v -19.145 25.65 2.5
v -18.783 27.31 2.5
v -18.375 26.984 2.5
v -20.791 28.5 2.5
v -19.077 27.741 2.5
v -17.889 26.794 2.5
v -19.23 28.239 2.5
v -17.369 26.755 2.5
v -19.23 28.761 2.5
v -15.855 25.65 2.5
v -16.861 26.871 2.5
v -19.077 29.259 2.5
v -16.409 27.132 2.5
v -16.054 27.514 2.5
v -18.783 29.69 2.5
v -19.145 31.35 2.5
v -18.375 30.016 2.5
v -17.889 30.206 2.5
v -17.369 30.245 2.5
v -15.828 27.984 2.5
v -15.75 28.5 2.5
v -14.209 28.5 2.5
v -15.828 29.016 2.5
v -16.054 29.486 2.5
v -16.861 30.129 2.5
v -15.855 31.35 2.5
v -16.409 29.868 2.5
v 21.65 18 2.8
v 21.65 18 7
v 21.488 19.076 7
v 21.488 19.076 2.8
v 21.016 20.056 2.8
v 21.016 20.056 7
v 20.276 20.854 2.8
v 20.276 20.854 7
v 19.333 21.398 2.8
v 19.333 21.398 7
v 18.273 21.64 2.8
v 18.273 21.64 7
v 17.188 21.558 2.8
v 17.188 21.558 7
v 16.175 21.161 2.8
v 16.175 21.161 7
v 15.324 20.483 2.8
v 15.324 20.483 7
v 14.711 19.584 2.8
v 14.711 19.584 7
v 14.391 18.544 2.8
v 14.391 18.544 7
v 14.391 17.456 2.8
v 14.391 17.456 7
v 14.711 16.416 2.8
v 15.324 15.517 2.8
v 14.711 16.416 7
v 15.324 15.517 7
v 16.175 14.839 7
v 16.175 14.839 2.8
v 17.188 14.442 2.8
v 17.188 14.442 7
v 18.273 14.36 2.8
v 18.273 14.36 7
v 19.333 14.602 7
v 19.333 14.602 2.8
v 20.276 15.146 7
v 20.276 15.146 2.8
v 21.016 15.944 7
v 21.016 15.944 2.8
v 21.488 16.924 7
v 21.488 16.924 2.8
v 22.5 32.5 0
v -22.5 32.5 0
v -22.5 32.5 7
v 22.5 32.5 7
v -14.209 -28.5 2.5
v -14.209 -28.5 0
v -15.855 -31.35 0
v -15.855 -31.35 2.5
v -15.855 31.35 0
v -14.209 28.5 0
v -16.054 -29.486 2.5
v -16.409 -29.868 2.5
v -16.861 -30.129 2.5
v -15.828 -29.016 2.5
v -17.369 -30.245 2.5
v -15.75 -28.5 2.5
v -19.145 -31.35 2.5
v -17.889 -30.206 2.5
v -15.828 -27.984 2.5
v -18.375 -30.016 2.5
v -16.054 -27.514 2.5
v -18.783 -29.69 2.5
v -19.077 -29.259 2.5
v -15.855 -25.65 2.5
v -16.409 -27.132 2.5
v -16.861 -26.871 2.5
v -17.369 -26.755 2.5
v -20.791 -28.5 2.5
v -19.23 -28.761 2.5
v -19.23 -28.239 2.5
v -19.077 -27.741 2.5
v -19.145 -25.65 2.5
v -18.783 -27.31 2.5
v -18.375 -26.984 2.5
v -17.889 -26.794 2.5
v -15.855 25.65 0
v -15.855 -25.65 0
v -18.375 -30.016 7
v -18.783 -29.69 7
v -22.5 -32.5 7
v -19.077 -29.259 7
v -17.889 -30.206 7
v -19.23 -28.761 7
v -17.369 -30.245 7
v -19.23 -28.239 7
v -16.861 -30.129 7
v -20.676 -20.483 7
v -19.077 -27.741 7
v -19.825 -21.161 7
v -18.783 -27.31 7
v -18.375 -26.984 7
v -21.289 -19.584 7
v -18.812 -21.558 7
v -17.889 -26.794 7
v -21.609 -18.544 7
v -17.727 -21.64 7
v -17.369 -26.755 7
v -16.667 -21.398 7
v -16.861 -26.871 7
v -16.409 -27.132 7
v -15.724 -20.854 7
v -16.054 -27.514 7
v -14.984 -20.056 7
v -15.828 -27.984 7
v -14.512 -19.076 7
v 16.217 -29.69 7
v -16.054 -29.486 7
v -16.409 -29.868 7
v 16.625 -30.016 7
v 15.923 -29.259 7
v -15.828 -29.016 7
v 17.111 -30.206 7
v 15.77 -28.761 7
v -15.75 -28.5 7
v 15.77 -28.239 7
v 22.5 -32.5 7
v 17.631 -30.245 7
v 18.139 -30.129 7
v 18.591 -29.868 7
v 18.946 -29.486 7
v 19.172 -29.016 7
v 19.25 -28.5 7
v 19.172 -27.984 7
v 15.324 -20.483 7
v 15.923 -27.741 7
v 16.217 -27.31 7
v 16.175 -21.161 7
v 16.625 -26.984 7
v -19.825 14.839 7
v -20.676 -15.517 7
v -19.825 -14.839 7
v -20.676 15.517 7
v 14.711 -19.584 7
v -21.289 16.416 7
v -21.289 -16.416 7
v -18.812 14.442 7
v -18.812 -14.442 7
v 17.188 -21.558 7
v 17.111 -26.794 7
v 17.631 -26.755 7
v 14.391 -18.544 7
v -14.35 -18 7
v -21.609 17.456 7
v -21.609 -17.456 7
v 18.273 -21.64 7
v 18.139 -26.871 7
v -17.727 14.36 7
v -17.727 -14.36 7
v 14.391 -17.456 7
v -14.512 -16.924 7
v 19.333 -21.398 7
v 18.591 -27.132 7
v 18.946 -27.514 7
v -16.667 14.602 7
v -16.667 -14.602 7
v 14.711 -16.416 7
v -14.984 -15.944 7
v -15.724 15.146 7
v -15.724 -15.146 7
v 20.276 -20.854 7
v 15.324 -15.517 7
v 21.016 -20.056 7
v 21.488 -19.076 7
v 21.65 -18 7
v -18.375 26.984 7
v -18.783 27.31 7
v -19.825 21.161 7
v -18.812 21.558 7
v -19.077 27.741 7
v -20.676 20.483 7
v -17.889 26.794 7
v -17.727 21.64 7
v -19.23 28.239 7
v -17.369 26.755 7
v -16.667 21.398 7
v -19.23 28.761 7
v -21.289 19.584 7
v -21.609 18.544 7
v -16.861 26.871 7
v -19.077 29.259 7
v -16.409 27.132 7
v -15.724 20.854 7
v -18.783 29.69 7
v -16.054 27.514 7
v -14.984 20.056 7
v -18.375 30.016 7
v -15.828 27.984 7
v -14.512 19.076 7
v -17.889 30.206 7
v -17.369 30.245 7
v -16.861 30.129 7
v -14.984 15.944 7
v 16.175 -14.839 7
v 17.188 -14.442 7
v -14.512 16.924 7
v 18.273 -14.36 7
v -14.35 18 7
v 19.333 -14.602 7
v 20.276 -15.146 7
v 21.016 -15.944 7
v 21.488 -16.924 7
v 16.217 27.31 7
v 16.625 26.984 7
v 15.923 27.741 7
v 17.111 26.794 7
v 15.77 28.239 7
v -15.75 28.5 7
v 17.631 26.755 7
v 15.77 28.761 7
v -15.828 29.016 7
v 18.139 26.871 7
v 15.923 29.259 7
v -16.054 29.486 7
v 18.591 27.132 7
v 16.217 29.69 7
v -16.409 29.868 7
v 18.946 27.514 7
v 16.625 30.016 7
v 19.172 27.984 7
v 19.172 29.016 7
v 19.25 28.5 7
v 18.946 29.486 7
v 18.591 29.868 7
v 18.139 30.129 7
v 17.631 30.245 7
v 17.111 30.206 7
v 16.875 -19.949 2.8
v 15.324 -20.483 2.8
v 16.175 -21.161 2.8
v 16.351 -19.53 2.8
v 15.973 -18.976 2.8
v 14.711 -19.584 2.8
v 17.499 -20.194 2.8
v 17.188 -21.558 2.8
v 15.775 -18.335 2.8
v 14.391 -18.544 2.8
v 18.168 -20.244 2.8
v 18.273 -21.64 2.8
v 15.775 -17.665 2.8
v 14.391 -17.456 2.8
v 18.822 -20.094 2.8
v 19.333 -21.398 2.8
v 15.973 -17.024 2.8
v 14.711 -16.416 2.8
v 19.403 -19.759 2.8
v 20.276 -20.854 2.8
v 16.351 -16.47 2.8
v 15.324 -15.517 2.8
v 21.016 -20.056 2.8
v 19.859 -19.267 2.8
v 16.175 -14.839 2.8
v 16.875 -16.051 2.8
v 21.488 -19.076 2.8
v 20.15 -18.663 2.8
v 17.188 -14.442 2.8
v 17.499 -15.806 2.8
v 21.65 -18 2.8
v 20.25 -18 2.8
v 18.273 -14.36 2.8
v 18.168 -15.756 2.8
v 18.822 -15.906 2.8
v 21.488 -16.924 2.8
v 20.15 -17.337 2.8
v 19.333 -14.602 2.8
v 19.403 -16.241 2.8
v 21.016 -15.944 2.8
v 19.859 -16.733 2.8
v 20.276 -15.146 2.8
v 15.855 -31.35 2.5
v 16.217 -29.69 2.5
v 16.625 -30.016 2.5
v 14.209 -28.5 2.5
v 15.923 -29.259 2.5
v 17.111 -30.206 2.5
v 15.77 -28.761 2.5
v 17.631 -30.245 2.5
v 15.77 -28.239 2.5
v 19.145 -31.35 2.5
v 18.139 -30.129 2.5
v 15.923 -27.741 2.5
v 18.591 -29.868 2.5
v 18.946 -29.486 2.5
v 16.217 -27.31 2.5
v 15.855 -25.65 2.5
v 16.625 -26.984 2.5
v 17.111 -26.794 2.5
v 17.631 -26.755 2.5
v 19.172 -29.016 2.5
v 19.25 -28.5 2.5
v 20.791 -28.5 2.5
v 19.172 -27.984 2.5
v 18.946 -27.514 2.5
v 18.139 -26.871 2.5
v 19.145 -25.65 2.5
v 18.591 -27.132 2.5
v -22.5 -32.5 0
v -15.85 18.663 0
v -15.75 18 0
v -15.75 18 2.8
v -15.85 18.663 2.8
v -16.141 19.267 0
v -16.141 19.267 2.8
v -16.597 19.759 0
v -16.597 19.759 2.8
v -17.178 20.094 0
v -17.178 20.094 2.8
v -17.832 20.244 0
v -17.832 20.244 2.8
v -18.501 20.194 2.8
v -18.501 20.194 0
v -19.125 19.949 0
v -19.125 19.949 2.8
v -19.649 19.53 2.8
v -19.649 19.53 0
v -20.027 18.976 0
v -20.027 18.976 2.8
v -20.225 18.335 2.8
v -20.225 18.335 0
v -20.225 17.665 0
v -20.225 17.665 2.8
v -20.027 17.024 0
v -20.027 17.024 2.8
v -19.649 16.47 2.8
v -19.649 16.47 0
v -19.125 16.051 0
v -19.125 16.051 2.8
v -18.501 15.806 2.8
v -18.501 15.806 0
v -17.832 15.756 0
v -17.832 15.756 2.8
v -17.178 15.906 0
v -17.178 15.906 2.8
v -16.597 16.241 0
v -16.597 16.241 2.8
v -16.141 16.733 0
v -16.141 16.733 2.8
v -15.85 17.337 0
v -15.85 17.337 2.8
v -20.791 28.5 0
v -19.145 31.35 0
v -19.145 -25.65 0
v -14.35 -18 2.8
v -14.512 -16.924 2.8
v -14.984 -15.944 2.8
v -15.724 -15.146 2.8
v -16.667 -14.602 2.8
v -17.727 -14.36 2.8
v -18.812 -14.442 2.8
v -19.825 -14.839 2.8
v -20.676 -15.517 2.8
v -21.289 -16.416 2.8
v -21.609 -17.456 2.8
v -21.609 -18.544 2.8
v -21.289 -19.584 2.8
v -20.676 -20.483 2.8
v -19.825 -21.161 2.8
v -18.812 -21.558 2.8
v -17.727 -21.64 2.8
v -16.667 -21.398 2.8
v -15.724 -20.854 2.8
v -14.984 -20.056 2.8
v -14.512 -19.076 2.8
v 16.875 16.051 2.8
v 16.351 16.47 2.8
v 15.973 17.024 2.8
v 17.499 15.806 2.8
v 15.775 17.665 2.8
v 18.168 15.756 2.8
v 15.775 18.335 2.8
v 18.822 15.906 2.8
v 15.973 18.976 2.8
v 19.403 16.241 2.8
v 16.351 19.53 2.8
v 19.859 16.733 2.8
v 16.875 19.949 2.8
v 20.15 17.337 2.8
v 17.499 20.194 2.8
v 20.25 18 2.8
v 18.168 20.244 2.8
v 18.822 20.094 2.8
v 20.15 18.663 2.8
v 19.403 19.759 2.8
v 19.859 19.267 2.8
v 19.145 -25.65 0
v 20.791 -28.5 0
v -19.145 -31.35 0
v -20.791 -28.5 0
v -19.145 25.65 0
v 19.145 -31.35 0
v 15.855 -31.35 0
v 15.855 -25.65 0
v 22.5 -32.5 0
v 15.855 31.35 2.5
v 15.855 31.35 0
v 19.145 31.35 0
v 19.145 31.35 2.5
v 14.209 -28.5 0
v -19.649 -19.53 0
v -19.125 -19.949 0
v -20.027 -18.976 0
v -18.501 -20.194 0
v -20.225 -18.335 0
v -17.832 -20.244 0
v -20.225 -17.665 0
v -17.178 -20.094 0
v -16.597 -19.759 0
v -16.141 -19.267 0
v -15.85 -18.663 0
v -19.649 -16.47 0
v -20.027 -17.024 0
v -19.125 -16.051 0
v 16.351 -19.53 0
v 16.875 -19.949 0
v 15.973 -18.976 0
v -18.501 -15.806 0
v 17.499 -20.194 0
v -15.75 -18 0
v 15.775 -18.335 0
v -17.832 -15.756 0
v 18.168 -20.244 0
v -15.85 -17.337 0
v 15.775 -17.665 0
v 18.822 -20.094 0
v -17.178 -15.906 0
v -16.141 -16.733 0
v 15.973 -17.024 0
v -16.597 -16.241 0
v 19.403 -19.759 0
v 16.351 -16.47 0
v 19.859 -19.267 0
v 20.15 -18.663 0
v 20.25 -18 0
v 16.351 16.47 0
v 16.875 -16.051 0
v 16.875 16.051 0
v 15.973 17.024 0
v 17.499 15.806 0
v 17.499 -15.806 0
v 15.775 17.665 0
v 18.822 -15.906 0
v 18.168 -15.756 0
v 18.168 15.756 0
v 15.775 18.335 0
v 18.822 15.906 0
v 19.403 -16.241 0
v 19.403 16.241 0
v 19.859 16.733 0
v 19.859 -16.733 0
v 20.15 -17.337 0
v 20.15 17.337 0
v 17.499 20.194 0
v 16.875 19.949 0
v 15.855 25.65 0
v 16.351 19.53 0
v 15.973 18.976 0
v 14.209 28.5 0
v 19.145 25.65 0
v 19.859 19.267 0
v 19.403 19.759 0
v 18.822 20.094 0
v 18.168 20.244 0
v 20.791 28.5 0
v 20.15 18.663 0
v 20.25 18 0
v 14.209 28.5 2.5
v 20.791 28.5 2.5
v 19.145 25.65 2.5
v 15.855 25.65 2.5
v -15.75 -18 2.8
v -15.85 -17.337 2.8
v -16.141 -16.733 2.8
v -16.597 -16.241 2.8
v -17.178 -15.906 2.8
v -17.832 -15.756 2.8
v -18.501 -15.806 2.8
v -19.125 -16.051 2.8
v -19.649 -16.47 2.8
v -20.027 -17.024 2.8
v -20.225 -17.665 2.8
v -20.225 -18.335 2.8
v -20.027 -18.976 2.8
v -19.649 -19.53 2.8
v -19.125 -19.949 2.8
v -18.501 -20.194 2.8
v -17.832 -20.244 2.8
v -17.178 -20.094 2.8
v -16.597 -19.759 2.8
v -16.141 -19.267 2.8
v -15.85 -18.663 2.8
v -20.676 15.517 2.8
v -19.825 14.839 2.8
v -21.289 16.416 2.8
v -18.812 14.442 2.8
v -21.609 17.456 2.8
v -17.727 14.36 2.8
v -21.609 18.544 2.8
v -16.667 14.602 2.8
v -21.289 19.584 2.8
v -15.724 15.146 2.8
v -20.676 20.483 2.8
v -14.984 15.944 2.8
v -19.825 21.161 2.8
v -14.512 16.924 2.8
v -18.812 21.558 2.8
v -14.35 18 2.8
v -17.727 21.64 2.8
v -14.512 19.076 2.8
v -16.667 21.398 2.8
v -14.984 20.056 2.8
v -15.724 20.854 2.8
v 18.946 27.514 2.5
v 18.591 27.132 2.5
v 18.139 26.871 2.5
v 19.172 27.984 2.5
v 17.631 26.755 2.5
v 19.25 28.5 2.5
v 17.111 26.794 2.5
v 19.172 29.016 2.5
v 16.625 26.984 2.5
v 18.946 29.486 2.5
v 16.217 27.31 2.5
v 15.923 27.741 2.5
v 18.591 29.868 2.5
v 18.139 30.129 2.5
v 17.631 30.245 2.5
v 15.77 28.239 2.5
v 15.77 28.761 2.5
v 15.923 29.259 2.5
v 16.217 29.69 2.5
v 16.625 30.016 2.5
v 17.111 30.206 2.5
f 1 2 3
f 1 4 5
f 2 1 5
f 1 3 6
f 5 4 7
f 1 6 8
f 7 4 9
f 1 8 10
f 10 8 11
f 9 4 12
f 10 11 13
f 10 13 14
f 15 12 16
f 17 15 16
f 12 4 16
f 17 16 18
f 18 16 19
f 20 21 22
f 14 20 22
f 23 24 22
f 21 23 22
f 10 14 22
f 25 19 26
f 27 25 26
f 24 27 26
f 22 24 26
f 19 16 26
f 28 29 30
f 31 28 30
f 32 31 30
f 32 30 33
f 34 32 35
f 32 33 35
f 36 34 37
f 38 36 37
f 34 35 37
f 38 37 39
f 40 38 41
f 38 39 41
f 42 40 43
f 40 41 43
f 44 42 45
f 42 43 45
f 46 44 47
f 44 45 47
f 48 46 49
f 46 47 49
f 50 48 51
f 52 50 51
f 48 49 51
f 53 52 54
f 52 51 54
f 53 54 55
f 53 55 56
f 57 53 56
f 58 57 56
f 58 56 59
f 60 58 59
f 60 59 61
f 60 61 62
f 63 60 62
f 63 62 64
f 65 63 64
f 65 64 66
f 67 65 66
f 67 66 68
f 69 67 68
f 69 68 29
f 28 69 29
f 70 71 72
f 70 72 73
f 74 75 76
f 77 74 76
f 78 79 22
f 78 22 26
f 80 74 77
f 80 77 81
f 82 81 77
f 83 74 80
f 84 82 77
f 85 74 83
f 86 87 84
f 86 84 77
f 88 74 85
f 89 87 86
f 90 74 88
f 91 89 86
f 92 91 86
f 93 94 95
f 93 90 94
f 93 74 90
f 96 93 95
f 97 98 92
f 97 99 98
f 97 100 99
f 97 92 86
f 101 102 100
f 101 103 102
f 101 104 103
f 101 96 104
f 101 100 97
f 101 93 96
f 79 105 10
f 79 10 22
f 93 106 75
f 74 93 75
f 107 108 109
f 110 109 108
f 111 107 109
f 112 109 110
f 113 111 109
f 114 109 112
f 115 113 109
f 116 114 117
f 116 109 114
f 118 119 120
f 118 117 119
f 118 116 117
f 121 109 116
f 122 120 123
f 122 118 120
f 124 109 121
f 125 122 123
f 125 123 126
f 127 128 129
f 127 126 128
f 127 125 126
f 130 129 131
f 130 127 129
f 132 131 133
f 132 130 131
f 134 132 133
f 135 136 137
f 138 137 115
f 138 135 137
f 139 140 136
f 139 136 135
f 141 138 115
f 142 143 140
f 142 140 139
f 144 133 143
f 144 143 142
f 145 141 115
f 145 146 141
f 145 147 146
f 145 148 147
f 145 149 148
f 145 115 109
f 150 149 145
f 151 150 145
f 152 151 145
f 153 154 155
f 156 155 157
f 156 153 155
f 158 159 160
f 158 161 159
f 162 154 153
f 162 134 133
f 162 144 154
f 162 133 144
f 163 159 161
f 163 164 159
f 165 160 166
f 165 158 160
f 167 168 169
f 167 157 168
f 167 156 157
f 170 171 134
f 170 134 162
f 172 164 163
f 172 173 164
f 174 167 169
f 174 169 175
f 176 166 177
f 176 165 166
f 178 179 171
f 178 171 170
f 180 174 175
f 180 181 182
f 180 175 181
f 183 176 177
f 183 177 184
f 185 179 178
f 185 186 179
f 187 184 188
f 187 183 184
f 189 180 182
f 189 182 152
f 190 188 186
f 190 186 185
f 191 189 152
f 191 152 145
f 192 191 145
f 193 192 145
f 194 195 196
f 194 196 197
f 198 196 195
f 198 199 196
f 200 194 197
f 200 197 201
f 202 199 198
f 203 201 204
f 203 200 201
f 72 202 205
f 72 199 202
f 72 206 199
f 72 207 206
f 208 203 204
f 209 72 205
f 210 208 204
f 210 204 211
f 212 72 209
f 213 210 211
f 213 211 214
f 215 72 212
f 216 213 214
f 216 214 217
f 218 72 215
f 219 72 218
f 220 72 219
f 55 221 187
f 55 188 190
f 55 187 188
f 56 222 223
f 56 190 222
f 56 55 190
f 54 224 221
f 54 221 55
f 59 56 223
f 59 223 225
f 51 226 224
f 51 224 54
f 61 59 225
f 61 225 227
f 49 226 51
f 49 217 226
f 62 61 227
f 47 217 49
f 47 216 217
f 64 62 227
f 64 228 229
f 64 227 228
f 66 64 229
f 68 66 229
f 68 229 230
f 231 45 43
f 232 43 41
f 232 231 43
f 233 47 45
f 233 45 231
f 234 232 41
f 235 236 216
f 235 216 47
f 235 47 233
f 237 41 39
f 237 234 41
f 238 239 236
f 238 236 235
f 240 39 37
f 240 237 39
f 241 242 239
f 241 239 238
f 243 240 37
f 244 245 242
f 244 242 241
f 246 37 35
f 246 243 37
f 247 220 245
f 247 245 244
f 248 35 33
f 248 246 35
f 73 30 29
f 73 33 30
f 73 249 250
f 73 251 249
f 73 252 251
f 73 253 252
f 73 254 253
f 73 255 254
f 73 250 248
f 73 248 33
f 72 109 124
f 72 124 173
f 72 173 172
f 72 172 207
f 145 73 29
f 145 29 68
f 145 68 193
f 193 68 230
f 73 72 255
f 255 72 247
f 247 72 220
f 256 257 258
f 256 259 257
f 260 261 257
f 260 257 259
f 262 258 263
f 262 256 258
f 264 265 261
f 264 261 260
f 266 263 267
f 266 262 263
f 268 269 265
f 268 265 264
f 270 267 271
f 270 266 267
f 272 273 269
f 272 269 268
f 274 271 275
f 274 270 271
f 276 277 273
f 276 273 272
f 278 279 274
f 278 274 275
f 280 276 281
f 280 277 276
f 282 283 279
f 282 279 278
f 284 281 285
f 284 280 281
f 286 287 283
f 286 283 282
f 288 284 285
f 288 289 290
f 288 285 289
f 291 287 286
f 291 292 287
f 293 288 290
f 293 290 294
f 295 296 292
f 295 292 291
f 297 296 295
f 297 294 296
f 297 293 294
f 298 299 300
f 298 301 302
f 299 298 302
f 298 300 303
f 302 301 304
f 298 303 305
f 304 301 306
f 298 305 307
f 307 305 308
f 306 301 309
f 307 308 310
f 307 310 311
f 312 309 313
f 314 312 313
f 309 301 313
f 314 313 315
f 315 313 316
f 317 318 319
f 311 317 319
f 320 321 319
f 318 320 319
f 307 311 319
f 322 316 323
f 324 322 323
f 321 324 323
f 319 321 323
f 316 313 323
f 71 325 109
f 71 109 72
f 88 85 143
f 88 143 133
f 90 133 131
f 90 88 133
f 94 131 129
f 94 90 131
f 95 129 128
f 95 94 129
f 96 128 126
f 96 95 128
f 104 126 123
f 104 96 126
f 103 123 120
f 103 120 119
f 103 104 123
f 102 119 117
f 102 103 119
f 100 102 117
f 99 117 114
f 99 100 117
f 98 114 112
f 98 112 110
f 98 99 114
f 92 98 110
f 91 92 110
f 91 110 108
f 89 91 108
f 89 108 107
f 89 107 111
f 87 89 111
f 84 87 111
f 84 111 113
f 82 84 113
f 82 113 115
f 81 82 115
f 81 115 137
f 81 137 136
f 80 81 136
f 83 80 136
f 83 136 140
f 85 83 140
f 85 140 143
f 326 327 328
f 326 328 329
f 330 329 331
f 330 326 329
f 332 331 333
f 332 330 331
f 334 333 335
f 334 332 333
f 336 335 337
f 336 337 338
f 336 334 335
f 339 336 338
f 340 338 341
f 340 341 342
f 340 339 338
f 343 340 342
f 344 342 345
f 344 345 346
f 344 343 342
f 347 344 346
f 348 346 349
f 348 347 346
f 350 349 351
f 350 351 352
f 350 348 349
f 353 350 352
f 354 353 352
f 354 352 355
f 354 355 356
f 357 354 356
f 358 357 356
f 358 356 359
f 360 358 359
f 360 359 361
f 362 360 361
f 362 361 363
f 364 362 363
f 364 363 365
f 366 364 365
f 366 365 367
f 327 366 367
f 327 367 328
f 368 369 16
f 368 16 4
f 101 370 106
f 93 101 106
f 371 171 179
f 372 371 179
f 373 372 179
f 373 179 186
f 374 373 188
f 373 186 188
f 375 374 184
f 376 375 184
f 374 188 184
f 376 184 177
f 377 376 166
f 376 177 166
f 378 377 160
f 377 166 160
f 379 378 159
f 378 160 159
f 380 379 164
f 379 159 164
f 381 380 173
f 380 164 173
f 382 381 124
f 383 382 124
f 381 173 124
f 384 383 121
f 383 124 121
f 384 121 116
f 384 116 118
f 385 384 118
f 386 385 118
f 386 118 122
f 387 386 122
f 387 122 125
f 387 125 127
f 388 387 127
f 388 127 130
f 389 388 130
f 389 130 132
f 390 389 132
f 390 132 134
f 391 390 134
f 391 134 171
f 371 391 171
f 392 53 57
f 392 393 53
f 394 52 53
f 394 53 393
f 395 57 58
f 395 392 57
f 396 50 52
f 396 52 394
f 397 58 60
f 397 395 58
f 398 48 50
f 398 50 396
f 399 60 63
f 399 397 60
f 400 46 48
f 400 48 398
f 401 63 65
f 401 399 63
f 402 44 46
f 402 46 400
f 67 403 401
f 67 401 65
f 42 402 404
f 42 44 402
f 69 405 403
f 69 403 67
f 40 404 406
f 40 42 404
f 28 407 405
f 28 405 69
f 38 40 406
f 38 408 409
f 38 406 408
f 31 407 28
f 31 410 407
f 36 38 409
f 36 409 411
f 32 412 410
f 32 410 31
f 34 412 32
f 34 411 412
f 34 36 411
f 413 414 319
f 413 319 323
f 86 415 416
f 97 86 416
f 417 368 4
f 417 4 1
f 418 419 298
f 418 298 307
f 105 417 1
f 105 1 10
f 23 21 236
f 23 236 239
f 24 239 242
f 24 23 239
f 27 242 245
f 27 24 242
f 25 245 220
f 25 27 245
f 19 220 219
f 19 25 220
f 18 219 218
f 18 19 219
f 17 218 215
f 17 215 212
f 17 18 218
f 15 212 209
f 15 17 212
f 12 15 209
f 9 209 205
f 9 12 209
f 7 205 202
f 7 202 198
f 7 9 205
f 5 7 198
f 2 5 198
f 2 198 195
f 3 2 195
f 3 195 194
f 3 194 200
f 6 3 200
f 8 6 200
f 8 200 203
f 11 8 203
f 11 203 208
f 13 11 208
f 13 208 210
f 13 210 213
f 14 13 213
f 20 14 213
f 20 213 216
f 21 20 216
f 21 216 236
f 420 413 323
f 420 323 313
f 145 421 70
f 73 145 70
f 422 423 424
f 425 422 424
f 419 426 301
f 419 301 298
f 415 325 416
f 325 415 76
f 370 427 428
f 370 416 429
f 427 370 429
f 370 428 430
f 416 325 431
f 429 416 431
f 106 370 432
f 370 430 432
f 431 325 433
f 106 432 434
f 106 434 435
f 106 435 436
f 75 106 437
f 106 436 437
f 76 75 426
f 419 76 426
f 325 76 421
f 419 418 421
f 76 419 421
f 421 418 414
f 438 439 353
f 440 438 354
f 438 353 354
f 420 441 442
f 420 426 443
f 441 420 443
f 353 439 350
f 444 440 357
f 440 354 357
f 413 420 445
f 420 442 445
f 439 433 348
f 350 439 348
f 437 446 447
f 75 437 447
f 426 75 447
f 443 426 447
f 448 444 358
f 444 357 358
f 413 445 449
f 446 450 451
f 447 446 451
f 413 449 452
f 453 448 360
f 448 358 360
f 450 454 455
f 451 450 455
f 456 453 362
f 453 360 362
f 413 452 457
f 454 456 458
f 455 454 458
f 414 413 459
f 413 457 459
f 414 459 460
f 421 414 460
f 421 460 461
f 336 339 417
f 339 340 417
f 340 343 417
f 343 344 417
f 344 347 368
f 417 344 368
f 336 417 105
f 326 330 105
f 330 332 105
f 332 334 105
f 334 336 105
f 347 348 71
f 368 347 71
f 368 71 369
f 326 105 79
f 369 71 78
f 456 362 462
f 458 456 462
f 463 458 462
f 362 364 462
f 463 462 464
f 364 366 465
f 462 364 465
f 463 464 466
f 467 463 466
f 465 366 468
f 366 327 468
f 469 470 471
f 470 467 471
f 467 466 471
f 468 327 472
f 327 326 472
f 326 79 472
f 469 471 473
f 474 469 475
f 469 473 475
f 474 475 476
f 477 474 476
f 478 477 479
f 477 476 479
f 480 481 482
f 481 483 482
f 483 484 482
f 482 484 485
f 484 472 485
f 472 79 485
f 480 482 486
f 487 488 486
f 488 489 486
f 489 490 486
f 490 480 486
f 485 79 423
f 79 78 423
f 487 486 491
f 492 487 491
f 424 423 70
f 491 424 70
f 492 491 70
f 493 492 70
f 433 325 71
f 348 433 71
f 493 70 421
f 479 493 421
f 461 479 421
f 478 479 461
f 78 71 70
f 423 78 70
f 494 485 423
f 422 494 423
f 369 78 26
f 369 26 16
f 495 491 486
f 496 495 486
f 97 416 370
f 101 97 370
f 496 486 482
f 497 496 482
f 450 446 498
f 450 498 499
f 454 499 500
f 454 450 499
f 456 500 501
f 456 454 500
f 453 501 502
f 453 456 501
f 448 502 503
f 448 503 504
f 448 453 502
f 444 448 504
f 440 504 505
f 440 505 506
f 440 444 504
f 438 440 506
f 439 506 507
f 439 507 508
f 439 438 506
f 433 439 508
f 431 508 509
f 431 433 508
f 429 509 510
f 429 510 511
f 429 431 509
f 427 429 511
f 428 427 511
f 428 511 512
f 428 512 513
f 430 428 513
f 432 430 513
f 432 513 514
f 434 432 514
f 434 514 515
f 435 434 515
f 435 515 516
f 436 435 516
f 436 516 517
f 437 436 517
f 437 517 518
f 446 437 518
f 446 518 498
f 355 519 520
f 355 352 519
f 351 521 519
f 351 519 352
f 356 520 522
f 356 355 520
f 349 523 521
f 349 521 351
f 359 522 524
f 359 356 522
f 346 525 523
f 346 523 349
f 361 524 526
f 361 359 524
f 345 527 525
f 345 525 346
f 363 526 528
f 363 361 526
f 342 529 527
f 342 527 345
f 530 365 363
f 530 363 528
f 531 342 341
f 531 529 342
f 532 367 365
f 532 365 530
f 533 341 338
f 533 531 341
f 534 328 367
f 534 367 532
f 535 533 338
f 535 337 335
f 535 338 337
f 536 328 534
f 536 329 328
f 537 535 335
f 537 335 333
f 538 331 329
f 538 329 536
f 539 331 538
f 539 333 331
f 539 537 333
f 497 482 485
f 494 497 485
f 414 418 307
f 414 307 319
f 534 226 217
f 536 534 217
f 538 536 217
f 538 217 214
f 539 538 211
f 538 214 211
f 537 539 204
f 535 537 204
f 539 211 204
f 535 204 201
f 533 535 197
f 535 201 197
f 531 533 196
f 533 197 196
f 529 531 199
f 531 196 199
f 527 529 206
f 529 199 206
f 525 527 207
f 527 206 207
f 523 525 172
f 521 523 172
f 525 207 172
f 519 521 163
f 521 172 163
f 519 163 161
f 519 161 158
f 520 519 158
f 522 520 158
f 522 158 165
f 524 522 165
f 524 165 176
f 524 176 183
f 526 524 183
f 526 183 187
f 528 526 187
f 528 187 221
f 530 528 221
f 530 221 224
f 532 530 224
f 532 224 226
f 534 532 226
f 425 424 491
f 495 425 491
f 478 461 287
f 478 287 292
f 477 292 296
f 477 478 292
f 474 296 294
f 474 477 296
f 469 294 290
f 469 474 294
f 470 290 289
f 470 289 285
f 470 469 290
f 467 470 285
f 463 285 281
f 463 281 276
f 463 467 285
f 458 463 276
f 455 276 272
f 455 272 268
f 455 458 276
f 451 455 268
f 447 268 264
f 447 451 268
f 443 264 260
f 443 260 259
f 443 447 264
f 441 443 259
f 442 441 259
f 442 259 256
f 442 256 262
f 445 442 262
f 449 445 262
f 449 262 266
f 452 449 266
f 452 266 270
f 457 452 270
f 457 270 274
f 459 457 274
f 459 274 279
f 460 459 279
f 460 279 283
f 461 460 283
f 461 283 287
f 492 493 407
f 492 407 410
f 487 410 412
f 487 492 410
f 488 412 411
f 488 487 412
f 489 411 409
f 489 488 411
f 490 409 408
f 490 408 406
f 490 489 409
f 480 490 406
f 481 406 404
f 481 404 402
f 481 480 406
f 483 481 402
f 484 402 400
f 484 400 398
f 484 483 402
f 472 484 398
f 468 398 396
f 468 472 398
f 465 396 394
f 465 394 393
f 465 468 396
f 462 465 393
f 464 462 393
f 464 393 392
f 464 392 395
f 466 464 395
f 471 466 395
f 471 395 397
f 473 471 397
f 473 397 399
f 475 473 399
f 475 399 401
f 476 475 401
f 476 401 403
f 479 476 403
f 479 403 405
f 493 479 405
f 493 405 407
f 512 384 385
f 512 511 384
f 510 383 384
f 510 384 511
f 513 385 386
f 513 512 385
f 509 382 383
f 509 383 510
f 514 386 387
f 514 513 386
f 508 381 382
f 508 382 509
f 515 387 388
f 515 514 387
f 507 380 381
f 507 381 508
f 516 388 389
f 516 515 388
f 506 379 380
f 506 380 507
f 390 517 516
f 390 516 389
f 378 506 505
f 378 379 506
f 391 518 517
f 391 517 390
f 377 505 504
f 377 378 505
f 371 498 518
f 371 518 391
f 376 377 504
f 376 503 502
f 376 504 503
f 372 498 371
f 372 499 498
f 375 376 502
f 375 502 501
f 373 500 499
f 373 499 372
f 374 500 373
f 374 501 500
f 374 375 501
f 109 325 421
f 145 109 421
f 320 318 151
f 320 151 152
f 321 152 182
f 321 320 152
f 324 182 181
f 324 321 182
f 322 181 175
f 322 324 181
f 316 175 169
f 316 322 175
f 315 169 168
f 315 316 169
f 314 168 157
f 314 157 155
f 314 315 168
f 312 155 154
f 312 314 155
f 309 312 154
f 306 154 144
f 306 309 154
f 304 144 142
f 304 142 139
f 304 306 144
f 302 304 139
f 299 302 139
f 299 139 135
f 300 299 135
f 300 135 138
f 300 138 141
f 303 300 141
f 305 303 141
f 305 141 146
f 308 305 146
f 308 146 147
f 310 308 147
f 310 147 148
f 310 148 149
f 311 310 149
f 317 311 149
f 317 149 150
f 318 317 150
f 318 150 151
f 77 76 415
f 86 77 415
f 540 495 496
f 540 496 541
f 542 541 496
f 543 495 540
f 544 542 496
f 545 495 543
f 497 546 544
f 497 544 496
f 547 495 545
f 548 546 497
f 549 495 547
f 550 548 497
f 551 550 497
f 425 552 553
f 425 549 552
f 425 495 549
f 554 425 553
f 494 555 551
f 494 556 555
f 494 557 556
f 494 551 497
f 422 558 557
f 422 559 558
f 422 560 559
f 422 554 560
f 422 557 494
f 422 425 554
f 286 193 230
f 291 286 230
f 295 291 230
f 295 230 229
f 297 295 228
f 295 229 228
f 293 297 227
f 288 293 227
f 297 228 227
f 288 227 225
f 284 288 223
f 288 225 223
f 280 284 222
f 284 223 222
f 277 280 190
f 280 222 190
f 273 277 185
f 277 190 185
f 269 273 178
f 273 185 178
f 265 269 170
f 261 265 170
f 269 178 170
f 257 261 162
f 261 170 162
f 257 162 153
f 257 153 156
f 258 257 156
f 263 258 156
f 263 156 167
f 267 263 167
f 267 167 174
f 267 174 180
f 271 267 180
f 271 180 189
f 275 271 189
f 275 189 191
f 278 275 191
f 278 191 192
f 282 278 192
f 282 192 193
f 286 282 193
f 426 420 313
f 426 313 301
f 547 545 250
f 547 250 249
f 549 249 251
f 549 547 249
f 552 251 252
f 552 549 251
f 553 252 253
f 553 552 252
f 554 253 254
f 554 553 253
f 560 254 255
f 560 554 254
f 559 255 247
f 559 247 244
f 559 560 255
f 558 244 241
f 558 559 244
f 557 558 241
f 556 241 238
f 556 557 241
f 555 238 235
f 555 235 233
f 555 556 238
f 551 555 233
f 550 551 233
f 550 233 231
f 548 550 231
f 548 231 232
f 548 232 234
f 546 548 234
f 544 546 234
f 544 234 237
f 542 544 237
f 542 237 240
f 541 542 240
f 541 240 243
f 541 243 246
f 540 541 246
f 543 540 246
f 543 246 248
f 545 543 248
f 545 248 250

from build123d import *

# Parameters (mm, degrees)
SKETCH_2_W                = 45
SKETCH_2_H                = 65
SKETCH_2_R                = 2.25
SKETCH_2_R_2              = 1.75
EXTRUDE_1_DEPTH           = 7
HOLE_WIZARD_1_D           = 4.5
HOLE_WIZARD_1_CBORE_D     = 7.3
HOLE_WIZARD_1_CBORE_DEPTH = 4.2
CUT_EXTRUDE_1_DEPTH       = 2.5


with BuildPart() as part:
    # 草圖2 → 填料-伸長1 (new body)
    with BuildSketch(Plane.XY):
        Rectangle(SKETCH_2_W, SKETCH_2_H)
        with Locations((-18, 18)):
            Circle(SKETCH_2_R, mode=Mode.SUBTRACT)
        with Locations((-17.5, 28.5)):
            Circle(SKETCH_2_R_2, mode=Mode.SUBTRACT)
        with Locations((18, 18)):
            Circle(SKETCH_2_R, mode=Mode.SUBTRACT)
        with Locations((18, -18)):
            Circle(SKETCH_2_R, mode=Mode.SUBTRACT)
        with Locations((-18, -18)):
            Circle(SKETCH_2_R, mode=Mode.SUBTRACT)
        with Locations((17.5, 28.5)):
            Circle(SKETCH_2_R_2, mode=Mode.SUBTRACT)
        with Locations((17.5, -28.5)):
            Circle(SKETCH_2_R_2, mode=Mode.SUBTRACT)
        with Locations((-17.5, -28.5)):
            Circle(SKETCH_2_R_2, mode=Mode.SUBTRACT)
    extrude(amount=EXTRUDE_1_DEPTH)

    # 鑽孔1 (through all)
    with Locations(Plane(origin=(-18, 18, 7), x_dir=(1, 0, 0), z_dir=(0, 0, 1))):
        with Locations((0, 0), (36, 0), (36, -36), (0, -36)):
            CounterBoreHole(HOLE_WIZARD_1_D / 2, HOLE_WIZARD_1_CBORE_D / 2, HOLE_WIZARD_1_CBORE_DEPTH)

    # 草圖4 → 除料-伸長1 (cut)
    with BuildSketch(Plane(origin=(0, 0, 0), x_dir=(-1, 0, 0), z_dir=(0, 0, -1))):
        Polygon((-14.209103466, 28.5), (-15.854551733, 31.35), (-19.145448267, 31.35), (-20.790896534, 28.5), (-19.145448267, 25.65), (-15.854551733, 25.65), align=None)
        Polygon((15.854551733, 25.65), (14.209103466, 28.5), (15.854551733, 31.35), (19.145448267, 31.35), (20.790896534, 28.5), (19.145448267, 25.65), align=None)
        Polygon((14.209103466, -28.5), (15.854551733, -31.35), (19.145448267, -31.35), (20.790896534, -28.5), (19.145448267, -25.65), (15.854551733, -25.65), align=None)
        Polygon((-15.854551733, -25.65), (-14.209103466, -28.5), (-15.854551733, -31.35), (-19.145448267, -31.35), (-20.790896534, -28.5), (-19.145448267, -25.65), align=None)
    extrude(amount=-CUT_EXTRUDE_1_DEPTH, mode=Mode.SUBTRACT)


solid = part.part
